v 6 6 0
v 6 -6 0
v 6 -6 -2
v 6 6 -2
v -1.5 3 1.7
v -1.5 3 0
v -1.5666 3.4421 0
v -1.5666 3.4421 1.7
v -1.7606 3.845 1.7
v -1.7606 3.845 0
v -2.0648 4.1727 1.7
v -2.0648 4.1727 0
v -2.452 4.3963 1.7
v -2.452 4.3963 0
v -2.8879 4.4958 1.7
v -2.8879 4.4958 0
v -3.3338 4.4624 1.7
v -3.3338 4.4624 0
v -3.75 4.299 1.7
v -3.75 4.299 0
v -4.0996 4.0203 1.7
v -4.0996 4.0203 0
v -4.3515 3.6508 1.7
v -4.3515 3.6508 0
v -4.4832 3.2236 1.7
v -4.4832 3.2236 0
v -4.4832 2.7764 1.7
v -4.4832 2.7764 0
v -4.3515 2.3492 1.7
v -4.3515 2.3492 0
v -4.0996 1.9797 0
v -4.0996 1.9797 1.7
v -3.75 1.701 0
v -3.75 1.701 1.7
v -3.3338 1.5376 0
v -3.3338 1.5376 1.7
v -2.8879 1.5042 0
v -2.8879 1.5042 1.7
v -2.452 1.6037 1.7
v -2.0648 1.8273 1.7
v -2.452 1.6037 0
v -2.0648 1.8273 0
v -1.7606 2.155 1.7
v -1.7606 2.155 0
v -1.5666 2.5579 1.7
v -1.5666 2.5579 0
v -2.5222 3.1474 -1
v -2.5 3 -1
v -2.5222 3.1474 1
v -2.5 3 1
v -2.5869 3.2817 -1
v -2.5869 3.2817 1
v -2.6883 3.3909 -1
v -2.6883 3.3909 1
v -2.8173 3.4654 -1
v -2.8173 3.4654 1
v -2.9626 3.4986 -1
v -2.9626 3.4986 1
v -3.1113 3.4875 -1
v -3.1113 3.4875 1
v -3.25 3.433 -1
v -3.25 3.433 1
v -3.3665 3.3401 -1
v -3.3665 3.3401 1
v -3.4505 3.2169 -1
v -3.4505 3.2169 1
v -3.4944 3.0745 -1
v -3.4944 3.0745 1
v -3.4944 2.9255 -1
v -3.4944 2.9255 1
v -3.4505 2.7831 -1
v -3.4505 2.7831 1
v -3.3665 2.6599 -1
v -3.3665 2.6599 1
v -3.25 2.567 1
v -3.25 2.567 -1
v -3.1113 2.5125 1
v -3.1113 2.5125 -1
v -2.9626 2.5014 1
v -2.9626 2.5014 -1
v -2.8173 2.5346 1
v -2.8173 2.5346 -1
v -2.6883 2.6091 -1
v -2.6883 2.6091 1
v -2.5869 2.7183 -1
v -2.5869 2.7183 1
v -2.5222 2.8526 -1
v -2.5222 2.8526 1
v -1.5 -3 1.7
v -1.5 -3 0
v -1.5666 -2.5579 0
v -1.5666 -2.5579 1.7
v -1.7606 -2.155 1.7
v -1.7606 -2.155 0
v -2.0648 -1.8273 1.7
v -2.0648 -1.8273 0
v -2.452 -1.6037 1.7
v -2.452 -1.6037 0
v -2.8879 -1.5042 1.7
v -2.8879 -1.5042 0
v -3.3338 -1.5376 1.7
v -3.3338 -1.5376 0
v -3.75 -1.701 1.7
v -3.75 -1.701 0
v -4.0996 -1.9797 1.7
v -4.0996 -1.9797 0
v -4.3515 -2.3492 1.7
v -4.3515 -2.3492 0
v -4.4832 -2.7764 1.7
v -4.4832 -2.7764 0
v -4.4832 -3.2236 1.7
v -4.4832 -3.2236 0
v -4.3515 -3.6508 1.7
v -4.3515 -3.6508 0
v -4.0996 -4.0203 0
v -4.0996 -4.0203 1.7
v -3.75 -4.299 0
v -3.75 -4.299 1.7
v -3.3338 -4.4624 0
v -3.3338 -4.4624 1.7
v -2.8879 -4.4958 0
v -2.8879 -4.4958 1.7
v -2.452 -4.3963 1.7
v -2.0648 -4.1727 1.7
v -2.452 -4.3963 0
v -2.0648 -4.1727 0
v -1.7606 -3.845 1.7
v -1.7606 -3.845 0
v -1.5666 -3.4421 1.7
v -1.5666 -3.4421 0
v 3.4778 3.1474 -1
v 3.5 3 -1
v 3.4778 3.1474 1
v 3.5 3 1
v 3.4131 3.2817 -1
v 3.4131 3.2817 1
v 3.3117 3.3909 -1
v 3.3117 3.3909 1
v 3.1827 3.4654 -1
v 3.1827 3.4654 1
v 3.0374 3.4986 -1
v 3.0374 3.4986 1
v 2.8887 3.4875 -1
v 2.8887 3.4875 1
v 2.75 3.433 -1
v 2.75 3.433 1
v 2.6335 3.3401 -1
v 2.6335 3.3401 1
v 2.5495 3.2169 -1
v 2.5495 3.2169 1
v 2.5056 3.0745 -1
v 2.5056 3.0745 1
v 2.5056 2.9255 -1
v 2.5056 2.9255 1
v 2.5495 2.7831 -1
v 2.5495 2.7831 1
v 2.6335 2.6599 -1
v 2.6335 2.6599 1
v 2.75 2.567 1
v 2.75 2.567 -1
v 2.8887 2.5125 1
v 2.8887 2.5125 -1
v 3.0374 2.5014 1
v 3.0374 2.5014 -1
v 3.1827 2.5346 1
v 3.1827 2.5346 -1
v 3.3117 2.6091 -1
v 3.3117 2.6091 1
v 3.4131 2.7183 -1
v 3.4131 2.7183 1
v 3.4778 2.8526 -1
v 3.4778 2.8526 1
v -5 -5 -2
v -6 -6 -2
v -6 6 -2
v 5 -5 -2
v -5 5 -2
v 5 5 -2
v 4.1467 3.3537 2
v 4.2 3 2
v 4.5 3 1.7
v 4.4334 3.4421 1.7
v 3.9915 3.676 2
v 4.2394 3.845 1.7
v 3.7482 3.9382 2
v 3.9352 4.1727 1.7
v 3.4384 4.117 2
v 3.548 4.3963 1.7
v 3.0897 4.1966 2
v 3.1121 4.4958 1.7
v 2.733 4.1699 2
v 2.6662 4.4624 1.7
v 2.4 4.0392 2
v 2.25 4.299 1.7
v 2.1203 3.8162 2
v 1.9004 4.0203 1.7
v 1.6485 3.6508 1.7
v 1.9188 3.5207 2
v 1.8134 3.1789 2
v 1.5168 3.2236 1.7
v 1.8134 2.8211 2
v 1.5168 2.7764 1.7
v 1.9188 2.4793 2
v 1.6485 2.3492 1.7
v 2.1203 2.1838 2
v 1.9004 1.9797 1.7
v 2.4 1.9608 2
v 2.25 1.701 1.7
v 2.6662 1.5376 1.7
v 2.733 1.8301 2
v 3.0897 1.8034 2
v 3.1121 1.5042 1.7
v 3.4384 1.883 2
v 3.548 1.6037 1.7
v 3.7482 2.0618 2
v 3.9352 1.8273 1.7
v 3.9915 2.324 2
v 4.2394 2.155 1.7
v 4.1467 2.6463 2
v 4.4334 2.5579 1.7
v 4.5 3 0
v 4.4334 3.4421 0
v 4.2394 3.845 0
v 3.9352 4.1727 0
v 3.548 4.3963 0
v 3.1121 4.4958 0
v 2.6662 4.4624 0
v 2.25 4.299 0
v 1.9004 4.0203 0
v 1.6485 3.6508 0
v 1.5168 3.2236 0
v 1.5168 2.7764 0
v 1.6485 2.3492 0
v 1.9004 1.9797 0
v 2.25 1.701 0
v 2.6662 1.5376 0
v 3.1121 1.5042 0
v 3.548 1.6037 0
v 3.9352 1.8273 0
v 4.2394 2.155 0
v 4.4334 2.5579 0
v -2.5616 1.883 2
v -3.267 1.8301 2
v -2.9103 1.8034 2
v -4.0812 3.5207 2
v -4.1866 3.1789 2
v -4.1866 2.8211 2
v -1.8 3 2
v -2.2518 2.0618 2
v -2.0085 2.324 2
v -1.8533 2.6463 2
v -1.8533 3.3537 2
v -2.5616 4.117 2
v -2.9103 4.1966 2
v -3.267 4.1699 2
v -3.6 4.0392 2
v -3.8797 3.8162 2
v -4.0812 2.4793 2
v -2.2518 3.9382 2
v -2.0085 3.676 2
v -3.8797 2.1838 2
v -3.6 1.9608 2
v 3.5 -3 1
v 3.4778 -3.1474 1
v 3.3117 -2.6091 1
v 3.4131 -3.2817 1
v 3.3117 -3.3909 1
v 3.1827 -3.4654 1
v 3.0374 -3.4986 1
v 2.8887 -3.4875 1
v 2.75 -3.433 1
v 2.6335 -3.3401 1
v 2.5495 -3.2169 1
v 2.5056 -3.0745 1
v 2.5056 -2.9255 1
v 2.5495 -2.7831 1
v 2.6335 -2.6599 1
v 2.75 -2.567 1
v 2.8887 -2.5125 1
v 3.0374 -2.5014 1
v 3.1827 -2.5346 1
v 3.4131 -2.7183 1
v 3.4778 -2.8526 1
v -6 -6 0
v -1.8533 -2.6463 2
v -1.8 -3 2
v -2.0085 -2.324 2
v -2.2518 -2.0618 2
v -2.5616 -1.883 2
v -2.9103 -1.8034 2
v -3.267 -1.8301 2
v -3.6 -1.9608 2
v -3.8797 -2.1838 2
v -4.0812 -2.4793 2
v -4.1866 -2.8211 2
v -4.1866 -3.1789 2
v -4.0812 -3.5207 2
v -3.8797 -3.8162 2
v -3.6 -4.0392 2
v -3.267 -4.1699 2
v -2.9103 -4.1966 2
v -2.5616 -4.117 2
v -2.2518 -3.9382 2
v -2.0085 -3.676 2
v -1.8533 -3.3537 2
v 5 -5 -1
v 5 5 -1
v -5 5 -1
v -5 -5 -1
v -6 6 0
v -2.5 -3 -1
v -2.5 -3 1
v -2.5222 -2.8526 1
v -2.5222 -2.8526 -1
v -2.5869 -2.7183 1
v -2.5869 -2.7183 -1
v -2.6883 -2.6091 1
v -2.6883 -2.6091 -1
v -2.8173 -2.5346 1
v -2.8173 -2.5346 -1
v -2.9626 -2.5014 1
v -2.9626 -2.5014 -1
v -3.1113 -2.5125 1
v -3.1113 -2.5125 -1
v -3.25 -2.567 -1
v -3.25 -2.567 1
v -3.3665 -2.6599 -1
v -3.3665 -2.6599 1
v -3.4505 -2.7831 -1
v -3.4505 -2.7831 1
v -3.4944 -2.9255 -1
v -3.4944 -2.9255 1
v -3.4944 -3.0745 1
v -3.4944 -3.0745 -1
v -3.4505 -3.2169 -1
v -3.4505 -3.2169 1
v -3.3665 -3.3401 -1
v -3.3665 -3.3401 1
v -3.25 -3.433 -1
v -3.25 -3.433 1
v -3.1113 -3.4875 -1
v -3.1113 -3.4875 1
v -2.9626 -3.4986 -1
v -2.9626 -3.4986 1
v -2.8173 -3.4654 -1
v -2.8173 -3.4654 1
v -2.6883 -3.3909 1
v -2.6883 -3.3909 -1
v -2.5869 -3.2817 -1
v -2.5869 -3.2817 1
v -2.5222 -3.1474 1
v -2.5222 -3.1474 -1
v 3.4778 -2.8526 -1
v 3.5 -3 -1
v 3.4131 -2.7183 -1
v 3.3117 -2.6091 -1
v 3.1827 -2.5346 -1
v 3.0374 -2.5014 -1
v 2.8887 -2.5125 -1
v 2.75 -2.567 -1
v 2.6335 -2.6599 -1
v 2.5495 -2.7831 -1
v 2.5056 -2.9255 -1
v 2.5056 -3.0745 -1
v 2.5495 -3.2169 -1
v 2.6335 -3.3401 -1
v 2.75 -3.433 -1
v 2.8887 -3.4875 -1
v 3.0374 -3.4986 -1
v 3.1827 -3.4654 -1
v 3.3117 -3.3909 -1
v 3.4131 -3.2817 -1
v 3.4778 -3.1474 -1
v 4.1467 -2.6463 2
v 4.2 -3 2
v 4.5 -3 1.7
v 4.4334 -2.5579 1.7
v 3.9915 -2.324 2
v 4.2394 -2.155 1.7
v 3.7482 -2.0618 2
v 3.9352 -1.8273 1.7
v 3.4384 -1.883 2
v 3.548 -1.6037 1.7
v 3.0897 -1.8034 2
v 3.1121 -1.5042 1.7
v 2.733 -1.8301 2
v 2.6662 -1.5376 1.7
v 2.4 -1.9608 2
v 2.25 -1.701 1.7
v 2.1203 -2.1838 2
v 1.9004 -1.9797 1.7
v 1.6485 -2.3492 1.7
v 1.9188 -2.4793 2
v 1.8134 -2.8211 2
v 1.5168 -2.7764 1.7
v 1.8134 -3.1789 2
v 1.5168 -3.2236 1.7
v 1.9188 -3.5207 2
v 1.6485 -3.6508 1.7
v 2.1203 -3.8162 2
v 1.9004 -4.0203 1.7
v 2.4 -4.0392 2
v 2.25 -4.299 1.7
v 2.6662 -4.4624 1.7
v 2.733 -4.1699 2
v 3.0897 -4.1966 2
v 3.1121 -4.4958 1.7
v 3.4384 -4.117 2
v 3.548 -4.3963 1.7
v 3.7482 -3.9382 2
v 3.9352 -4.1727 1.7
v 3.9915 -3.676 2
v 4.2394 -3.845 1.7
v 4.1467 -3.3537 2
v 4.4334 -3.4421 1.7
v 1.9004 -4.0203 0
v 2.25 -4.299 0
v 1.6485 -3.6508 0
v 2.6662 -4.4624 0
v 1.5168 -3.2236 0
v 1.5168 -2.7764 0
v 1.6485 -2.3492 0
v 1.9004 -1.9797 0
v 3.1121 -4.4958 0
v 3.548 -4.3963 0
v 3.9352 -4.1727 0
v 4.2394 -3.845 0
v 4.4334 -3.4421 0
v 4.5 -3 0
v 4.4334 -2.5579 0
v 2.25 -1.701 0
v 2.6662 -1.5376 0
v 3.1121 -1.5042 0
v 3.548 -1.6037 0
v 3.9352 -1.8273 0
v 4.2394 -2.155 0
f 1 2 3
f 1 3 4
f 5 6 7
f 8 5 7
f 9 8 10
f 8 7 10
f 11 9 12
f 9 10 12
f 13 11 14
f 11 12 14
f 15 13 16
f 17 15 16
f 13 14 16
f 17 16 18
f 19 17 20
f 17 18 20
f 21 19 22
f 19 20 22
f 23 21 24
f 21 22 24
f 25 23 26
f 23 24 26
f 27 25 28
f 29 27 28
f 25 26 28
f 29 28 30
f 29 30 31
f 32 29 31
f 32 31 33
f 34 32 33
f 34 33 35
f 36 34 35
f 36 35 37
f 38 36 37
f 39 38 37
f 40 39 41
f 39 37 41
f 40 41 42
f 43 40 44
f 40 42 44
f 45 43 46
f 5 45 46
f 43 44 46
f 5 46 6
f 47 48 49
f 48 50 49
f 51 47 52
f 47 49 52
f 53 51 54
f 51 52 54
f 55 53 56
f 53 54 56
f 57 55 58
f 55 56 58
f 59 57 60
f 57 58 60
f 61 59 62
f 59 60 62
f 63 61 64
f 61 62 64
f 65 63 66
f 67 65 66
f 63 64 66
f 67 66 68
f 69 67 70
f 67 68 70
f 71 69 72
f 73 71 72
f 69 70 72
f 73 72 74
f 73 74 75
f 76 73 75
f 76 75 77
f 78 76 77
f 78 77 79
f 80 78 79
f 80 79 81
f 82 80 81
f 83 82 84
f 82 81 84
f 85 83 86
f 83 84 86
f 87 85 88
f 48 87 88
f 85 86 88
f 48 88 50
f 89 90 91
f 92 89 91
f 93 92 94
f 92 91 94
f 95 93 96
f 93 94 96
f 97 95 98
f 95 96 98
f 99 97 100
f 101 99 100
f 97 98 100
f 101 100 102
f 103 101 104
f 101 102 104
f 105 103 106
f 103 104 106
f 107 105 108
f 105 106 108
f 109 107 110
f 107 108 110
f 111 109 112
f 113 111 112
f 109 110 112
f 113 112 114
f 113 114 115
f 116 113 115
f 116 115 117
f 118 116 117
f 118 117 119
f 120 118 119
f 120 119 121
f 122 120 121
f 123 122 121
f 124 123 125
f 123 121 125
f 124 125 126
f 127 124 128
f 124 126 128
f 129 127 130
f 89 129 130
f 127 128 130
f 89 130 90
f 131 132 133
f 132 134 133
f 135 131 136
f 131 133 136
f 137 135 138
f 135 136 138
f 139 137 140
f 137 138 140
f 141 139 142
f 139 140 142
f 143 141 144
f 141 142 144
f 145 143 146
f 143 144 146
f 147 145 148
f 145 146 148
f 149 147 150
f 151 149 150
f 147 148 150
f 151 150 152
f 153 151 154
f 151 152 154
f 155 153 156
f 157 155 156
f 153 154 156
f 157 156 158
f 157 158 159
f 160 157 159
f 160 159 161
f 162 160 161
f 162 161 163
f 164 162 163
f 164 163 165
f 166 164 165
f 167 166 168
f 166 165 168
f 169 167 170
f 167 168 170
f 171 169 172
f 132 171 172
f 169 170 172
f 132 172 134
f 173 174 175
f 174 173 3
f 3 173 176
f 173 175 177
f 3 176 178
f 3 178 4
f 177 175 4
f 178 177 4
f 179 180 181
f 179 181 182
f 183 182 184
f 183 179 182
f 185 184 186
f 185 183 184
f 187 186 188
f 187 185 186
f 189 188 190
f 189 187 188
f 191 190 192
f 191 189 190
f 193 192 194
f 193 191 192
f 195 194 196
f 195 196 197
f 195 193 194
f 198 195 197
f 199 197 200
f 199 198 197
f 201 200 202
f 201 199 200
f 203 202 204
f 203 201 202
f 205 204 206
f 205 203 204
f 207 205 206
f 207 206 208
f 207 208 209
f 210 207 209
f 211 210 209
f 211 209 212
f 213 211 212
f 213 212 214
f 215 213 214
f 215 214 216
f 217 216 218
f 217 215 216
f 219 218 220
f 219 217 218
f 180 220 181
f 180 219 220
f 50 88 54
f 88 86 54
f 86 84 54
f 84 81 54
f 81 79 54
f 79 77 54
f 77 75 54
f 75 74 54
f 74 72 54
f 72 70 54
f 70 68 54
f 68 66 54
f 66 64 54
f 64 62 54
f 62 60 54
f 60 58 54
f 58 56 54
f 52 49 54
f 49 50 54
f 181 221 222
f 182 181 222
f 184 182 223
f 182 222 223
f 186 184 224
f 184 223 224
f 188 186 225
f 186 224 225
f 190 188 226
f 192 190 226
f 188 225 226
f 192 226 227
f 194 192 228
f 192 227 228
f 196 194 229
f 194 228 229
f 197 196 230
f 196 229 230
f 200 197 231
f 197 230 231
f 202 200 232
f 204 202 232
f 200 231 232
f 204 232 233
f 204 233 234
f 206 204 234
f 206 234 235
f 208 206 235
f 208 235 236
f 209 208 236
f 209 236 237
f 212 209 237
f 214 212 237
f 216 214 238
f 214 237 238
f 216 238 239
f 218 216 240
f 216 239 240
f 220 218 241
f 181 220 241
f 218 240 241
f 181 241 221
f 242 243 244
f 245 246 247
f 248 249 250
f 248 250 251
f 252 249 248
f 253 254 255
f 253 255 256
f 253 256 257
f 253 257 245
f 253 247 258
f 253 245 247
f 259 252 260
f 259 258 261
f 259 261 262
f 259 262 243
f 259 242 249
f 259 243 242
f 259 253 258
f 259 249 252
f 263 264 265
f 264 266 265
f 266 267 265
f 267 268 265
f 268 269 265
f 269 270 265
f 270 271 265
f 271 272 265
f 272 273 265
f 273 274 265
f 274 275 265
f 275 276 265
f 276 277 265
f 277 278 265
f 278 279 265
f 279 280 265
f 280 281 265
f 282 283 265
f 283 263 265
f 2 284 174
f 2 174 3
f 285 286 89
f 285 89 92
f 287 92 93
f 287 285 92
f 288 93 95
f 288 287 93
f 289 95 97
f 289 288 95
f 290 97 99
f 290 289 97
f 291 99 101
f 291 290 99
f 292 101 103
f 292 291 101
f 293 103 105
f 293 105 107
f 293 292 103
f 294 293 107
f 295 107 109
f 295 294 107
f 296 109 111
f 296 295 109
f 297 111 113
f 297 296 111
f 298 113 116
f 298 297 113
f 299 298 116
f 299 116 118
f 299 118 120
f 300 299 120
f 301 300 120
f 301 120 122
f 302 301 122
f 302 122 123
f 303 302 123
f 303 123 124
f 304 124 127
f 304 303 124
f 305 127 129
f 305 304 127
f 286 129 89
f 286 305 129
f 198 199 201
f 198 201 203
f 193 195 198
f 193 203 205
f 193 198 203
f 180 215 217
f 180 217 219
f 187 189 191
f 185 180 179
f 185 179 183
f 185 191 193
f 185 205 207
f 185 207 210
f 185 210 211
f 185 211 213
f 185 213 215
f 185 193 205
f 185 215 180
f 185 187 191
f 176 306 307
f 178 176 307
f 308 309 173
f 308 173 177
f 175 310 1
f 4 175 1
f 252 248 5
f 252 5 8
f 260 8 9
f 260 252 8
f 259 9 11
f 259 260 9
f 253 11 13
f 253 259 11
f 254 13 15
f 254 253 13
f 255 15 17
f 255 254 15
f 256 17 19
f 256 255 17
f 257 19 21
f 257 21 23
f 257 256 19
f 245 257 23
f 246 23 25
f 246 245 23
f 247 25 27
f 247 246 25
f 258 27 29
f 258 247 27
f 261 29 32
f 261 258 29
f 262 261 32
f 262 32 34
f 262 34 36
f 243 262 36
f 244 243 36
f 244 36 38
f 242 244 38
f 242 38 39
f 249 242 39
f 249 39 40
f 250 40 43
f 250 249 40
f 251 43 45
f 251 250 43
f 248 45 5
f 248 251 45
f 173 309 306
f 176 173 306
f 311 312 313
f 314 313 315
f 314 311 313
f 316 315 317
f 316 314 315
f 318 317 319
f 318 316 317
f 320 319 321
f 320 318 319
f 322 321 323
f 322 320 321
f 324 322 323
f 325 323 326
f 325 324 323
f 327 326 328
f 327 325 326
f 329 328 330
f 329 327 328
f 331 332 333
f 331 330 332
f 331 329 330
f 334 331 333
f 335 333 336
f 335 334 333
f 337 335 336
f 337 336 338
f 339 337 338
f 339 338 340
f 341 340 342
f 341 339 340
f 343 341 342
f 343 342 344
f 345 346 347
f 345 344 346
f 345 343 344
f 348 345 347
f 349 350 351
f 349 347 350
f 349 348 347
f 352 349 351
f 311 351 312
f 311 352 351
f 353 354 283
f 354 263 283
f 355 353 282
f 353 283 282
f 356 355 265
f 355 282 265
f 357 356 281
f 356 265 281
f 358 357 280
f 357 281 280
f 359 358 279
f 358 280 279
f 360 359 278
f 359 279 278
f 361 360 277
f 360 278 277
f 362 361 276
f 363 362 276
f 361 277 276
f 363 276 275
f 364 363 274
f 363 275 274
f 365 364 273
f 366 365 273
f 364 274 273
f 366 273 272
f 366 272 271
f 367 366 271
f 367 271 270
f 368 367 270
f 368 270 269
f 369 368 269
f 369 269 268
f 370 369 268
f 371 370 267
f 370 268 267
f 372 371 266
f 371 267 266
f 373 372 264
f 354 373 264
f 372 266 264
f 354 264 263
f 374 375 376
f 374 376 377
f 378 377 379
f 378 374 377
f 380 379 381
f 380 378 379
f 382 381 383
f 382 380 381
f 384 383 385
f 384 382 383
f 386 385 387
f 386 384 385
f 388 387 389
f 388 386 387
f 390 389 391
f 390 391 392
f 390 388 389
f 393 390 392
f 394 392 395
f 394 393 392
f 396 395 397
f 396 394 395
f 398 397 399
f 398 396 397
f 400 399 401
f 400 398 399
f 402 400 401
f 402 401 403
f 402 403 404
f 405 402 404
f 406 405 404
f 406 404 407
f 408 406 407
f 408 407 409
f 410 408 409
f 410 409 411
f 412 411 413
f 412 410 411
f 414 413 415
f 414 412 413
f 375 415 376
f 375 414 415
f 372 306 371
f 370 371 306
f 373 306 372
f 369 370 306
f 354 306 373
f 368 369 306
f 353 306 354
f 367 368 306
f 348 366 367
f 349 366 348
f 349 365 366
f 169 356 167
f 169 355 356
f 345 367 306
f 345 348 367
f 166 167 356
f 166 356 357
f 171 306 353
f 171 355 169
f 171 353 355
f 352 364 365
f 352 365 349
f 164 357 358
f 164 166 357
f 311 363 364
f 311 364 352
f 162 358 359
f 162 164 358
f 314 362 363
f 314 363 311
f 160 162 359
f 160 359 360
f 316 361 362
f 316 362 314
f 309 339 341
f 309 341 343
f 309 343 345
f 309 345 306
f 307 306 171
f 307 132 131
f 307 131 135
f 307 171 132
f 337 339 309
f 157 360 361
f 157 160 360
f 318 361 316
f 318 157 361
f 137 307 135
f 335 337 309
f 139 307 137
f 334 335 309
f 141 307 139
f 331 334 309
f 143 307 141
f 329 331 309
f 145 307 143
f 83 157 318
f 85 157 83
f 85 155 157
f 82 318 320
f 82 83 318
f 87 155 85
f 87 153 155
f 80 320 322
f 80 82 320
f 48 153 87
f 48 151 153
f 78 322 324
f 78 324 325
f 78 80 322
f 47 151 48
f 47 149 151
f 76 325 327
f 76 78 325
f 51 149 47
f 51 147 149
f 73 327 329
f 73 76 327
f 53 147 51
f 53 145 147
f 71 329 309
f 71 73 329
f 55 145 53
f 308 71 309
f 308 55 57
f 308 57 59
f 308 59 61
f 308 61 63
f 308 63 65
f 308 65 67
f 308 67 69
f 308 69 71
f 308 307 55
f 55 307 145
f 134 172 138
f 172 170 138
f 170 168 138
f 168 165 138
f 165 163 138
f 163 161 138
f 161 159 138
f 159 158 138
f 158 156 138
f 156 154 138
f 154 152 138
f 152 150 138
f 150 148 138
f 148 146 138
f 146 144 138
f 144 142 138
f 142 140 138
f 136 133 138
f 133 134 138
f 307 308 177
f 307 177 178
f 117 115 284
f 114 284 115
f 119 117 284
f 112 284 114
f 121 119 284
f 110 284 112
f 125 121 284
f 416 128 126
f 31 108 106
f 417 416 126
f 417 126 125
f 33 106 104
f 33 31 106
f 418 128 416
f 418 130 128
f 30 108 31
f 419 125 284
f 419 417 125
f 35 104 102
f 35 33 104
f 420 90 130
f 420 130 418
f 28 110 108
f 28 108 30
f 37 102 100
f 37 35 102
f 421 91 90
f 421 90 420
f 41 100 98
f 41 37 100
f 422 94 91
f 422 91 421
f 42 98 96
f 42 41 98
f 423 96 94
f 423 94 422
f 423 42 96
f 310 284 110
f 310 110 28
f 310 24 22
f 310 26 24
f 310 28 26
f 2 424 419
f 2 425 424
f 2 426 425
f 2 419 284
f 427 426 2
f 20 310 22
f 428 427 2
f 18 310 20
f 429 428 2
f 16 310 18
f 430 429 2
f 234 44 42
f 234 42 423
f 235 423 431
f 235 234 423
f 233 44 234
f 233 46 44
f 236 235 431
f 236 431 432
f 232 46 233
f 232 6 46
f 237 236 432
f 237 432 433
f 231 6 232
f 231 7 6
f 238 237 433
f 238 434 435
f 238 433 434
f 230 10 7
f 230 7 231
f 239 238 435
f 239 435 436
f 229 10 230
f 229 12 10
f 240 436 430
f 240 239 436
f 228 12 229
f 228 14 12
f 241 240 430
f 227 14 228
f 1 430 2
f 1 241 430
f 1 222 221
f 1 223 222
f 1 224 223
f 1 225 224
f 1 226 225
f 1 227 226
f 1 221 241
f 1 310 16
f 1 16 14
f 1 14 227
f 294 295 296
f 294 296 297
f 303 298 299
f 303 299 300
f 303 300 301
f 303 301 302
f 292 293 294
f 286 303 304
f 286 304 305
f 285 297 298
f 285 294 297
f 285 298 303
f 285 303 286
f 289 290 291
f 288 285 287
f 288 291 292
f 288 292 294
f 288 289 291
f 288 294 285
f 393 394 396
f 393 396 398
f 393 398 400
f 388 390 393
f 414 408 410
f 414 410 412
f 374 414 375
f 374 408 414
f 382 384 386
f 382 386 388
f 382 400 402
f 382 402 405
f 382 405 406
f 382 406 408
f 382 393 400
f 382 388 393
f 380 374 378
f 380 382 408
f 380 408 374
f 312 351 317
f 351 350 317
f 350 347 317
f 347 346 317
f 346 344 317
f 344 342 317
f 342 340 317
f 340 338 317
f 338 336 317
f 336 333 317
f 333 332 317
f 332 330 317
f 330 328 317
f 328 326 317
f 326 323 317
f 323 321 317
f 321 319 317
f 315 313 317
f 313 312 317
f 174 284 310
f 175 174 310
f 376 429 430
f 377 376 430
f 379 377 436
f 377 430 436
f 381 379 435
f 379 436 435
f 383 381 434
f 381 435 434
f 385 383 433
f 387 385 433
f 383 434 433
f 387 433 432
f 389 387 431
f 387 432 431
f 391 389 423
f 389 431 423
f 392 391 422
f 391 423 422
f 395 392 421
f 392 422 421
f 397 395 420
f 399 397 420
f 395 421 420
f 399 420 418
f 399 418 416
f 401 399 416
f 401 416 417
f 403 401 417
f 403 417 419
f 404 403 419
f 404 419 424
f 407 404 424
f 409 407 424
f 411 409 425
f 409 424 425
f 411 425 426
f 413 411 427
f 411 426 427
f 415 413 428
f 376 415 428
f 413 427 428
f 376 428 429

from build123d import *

# Parameters (mm, degrees)
F3_W     = 12
F3_H     = 12
F0_DEPTH = 2
F1_R     = 1.5
F4_DEPTH = 2
F5_SIZE  = 0.3
F2_T     = 1


# Not quite as in the source:
# - a shell that OpenCascade refuses in one call is made with other operations: the cavity is built on its own and cut out


with BuildPart() as f0:
    # F3 (on Top) → F0 (new body)
    with BuildSketch(Plane.XY):
        Rectangle(F3_W, F3_H)
    extrude(amount=-F0_DEPTH)

    # F1 (on Top) → F4 (join)
    with BuildSketch(Plane.XY):
        with Locations((3, 3)):
            Circle(F1_R)
        with Locations((-3, 3)):
            Circle(F1_R)
        with Locations((3, -3)):
            Circle(F1_R)
        with Locations((-3, -3)):
            Circle(F1_R)
    extrude(amount=F4_DEPTH)

    # F5
    f5_edges = [f0.edges().sort_by_distance(p)[0] for p in [
        (-4.5, 3, 2),
        (1.5, 3, 2),
        (-4.5, -3, 2),
        (1.5, -3, 2),
    ]]
    chamfer(f5_edges, length=F5_SIZE)

    # F2: shell of thickness 1, made by hand


with BuildPart() as f2_core1:
    # F2_t2: copy of F0
    add(f0.part)

    # the walls: a layer under each face that stays
    f2_faces = [f2_core1.faces().sort_by_distance(p)[0] for p in [
        (-4.5, -3, 0.85),
        (-4.35, -3, 1.85),
        (0, 0, 0),
        (-3, -3, 2),
        (0, 6, -1),
        (6, 0, -1),
        (-6, 0, -1),
        (0, -6, -1),
        (1.5, -3, 0.85),
        (-4.5, 3, 0.85),
        (1.5, 3, 0.85),
        (1.65, -3, 1.85),
        (-4.35, 3, 1.85),
        (1.65, 3, 1.85),
        (3, -3, 2),
        (-3, 3, 2),
        (3, 3, 2),
    ]]
    thicken(f2_faces, amount=-F2_T, mode=Mode.SUBTRACT)

    # F2_s3 → F2_t4 (revolve, cut)
    with BuildSketch(Plane.XZ.offset(3)):
        Polygon((-1.49, 0.01), (-2.5, 0), (-2.5, -1), (-1.5, -1), align=None)
    revolve(axis=Axis((-3, -3, 0), (0, 0, 1)), mode=Mode.SUBTRACT)

    # F2_s5 → F2_t6 (revolve, cut)
    with BuildSketch(Plane.XZ.offset(3)):
        Polygon((4.51, 0.01), (4.5, -1), (3.5, -1), (3.5, 0), align=None)
    revolve(axis=Axis((3, -3, 0), (0, 0, 1)), mode=Mode.SUBTRACT)

    # F2_s7 → F2_t8 (revolve, cut)
    with BuildSketch(Plane.XZ.offset(-3)):
        Polygon((-1.49, 0.01), (-1.5, -1), (-2.5, -1), (-2.5, 0), align=None)
    revolve(axis=Axis((-3, 3, 0), (0, 0, 1)), mode=Mode.SUBTRACT)

    # F2_s9 → F2_t10 (revolve, cut)
    with BuildSketch(Plane.XZ.offset(-3)):
        Polygon((4.51, 0.01), (4.5, -1), (3.5, -1), (3.5, 0), align=None)
    revolve(axis=Axis((3, 3, 0), (0, 0, 1)), mode=Mode.SUBTRACT)


with BuildPart() as f0_1:
    add(f0.part)

    # what is left inside the walls is the cavity
    f2_cavity = [f2_core1.part.solids().sort_by_distance(p)[0] for p in [
        (0, -1.666667, -1.99),
    ]]
    add(f2_cavity, mode=Mode.SUBTRACT)


solid = f0_1.part
